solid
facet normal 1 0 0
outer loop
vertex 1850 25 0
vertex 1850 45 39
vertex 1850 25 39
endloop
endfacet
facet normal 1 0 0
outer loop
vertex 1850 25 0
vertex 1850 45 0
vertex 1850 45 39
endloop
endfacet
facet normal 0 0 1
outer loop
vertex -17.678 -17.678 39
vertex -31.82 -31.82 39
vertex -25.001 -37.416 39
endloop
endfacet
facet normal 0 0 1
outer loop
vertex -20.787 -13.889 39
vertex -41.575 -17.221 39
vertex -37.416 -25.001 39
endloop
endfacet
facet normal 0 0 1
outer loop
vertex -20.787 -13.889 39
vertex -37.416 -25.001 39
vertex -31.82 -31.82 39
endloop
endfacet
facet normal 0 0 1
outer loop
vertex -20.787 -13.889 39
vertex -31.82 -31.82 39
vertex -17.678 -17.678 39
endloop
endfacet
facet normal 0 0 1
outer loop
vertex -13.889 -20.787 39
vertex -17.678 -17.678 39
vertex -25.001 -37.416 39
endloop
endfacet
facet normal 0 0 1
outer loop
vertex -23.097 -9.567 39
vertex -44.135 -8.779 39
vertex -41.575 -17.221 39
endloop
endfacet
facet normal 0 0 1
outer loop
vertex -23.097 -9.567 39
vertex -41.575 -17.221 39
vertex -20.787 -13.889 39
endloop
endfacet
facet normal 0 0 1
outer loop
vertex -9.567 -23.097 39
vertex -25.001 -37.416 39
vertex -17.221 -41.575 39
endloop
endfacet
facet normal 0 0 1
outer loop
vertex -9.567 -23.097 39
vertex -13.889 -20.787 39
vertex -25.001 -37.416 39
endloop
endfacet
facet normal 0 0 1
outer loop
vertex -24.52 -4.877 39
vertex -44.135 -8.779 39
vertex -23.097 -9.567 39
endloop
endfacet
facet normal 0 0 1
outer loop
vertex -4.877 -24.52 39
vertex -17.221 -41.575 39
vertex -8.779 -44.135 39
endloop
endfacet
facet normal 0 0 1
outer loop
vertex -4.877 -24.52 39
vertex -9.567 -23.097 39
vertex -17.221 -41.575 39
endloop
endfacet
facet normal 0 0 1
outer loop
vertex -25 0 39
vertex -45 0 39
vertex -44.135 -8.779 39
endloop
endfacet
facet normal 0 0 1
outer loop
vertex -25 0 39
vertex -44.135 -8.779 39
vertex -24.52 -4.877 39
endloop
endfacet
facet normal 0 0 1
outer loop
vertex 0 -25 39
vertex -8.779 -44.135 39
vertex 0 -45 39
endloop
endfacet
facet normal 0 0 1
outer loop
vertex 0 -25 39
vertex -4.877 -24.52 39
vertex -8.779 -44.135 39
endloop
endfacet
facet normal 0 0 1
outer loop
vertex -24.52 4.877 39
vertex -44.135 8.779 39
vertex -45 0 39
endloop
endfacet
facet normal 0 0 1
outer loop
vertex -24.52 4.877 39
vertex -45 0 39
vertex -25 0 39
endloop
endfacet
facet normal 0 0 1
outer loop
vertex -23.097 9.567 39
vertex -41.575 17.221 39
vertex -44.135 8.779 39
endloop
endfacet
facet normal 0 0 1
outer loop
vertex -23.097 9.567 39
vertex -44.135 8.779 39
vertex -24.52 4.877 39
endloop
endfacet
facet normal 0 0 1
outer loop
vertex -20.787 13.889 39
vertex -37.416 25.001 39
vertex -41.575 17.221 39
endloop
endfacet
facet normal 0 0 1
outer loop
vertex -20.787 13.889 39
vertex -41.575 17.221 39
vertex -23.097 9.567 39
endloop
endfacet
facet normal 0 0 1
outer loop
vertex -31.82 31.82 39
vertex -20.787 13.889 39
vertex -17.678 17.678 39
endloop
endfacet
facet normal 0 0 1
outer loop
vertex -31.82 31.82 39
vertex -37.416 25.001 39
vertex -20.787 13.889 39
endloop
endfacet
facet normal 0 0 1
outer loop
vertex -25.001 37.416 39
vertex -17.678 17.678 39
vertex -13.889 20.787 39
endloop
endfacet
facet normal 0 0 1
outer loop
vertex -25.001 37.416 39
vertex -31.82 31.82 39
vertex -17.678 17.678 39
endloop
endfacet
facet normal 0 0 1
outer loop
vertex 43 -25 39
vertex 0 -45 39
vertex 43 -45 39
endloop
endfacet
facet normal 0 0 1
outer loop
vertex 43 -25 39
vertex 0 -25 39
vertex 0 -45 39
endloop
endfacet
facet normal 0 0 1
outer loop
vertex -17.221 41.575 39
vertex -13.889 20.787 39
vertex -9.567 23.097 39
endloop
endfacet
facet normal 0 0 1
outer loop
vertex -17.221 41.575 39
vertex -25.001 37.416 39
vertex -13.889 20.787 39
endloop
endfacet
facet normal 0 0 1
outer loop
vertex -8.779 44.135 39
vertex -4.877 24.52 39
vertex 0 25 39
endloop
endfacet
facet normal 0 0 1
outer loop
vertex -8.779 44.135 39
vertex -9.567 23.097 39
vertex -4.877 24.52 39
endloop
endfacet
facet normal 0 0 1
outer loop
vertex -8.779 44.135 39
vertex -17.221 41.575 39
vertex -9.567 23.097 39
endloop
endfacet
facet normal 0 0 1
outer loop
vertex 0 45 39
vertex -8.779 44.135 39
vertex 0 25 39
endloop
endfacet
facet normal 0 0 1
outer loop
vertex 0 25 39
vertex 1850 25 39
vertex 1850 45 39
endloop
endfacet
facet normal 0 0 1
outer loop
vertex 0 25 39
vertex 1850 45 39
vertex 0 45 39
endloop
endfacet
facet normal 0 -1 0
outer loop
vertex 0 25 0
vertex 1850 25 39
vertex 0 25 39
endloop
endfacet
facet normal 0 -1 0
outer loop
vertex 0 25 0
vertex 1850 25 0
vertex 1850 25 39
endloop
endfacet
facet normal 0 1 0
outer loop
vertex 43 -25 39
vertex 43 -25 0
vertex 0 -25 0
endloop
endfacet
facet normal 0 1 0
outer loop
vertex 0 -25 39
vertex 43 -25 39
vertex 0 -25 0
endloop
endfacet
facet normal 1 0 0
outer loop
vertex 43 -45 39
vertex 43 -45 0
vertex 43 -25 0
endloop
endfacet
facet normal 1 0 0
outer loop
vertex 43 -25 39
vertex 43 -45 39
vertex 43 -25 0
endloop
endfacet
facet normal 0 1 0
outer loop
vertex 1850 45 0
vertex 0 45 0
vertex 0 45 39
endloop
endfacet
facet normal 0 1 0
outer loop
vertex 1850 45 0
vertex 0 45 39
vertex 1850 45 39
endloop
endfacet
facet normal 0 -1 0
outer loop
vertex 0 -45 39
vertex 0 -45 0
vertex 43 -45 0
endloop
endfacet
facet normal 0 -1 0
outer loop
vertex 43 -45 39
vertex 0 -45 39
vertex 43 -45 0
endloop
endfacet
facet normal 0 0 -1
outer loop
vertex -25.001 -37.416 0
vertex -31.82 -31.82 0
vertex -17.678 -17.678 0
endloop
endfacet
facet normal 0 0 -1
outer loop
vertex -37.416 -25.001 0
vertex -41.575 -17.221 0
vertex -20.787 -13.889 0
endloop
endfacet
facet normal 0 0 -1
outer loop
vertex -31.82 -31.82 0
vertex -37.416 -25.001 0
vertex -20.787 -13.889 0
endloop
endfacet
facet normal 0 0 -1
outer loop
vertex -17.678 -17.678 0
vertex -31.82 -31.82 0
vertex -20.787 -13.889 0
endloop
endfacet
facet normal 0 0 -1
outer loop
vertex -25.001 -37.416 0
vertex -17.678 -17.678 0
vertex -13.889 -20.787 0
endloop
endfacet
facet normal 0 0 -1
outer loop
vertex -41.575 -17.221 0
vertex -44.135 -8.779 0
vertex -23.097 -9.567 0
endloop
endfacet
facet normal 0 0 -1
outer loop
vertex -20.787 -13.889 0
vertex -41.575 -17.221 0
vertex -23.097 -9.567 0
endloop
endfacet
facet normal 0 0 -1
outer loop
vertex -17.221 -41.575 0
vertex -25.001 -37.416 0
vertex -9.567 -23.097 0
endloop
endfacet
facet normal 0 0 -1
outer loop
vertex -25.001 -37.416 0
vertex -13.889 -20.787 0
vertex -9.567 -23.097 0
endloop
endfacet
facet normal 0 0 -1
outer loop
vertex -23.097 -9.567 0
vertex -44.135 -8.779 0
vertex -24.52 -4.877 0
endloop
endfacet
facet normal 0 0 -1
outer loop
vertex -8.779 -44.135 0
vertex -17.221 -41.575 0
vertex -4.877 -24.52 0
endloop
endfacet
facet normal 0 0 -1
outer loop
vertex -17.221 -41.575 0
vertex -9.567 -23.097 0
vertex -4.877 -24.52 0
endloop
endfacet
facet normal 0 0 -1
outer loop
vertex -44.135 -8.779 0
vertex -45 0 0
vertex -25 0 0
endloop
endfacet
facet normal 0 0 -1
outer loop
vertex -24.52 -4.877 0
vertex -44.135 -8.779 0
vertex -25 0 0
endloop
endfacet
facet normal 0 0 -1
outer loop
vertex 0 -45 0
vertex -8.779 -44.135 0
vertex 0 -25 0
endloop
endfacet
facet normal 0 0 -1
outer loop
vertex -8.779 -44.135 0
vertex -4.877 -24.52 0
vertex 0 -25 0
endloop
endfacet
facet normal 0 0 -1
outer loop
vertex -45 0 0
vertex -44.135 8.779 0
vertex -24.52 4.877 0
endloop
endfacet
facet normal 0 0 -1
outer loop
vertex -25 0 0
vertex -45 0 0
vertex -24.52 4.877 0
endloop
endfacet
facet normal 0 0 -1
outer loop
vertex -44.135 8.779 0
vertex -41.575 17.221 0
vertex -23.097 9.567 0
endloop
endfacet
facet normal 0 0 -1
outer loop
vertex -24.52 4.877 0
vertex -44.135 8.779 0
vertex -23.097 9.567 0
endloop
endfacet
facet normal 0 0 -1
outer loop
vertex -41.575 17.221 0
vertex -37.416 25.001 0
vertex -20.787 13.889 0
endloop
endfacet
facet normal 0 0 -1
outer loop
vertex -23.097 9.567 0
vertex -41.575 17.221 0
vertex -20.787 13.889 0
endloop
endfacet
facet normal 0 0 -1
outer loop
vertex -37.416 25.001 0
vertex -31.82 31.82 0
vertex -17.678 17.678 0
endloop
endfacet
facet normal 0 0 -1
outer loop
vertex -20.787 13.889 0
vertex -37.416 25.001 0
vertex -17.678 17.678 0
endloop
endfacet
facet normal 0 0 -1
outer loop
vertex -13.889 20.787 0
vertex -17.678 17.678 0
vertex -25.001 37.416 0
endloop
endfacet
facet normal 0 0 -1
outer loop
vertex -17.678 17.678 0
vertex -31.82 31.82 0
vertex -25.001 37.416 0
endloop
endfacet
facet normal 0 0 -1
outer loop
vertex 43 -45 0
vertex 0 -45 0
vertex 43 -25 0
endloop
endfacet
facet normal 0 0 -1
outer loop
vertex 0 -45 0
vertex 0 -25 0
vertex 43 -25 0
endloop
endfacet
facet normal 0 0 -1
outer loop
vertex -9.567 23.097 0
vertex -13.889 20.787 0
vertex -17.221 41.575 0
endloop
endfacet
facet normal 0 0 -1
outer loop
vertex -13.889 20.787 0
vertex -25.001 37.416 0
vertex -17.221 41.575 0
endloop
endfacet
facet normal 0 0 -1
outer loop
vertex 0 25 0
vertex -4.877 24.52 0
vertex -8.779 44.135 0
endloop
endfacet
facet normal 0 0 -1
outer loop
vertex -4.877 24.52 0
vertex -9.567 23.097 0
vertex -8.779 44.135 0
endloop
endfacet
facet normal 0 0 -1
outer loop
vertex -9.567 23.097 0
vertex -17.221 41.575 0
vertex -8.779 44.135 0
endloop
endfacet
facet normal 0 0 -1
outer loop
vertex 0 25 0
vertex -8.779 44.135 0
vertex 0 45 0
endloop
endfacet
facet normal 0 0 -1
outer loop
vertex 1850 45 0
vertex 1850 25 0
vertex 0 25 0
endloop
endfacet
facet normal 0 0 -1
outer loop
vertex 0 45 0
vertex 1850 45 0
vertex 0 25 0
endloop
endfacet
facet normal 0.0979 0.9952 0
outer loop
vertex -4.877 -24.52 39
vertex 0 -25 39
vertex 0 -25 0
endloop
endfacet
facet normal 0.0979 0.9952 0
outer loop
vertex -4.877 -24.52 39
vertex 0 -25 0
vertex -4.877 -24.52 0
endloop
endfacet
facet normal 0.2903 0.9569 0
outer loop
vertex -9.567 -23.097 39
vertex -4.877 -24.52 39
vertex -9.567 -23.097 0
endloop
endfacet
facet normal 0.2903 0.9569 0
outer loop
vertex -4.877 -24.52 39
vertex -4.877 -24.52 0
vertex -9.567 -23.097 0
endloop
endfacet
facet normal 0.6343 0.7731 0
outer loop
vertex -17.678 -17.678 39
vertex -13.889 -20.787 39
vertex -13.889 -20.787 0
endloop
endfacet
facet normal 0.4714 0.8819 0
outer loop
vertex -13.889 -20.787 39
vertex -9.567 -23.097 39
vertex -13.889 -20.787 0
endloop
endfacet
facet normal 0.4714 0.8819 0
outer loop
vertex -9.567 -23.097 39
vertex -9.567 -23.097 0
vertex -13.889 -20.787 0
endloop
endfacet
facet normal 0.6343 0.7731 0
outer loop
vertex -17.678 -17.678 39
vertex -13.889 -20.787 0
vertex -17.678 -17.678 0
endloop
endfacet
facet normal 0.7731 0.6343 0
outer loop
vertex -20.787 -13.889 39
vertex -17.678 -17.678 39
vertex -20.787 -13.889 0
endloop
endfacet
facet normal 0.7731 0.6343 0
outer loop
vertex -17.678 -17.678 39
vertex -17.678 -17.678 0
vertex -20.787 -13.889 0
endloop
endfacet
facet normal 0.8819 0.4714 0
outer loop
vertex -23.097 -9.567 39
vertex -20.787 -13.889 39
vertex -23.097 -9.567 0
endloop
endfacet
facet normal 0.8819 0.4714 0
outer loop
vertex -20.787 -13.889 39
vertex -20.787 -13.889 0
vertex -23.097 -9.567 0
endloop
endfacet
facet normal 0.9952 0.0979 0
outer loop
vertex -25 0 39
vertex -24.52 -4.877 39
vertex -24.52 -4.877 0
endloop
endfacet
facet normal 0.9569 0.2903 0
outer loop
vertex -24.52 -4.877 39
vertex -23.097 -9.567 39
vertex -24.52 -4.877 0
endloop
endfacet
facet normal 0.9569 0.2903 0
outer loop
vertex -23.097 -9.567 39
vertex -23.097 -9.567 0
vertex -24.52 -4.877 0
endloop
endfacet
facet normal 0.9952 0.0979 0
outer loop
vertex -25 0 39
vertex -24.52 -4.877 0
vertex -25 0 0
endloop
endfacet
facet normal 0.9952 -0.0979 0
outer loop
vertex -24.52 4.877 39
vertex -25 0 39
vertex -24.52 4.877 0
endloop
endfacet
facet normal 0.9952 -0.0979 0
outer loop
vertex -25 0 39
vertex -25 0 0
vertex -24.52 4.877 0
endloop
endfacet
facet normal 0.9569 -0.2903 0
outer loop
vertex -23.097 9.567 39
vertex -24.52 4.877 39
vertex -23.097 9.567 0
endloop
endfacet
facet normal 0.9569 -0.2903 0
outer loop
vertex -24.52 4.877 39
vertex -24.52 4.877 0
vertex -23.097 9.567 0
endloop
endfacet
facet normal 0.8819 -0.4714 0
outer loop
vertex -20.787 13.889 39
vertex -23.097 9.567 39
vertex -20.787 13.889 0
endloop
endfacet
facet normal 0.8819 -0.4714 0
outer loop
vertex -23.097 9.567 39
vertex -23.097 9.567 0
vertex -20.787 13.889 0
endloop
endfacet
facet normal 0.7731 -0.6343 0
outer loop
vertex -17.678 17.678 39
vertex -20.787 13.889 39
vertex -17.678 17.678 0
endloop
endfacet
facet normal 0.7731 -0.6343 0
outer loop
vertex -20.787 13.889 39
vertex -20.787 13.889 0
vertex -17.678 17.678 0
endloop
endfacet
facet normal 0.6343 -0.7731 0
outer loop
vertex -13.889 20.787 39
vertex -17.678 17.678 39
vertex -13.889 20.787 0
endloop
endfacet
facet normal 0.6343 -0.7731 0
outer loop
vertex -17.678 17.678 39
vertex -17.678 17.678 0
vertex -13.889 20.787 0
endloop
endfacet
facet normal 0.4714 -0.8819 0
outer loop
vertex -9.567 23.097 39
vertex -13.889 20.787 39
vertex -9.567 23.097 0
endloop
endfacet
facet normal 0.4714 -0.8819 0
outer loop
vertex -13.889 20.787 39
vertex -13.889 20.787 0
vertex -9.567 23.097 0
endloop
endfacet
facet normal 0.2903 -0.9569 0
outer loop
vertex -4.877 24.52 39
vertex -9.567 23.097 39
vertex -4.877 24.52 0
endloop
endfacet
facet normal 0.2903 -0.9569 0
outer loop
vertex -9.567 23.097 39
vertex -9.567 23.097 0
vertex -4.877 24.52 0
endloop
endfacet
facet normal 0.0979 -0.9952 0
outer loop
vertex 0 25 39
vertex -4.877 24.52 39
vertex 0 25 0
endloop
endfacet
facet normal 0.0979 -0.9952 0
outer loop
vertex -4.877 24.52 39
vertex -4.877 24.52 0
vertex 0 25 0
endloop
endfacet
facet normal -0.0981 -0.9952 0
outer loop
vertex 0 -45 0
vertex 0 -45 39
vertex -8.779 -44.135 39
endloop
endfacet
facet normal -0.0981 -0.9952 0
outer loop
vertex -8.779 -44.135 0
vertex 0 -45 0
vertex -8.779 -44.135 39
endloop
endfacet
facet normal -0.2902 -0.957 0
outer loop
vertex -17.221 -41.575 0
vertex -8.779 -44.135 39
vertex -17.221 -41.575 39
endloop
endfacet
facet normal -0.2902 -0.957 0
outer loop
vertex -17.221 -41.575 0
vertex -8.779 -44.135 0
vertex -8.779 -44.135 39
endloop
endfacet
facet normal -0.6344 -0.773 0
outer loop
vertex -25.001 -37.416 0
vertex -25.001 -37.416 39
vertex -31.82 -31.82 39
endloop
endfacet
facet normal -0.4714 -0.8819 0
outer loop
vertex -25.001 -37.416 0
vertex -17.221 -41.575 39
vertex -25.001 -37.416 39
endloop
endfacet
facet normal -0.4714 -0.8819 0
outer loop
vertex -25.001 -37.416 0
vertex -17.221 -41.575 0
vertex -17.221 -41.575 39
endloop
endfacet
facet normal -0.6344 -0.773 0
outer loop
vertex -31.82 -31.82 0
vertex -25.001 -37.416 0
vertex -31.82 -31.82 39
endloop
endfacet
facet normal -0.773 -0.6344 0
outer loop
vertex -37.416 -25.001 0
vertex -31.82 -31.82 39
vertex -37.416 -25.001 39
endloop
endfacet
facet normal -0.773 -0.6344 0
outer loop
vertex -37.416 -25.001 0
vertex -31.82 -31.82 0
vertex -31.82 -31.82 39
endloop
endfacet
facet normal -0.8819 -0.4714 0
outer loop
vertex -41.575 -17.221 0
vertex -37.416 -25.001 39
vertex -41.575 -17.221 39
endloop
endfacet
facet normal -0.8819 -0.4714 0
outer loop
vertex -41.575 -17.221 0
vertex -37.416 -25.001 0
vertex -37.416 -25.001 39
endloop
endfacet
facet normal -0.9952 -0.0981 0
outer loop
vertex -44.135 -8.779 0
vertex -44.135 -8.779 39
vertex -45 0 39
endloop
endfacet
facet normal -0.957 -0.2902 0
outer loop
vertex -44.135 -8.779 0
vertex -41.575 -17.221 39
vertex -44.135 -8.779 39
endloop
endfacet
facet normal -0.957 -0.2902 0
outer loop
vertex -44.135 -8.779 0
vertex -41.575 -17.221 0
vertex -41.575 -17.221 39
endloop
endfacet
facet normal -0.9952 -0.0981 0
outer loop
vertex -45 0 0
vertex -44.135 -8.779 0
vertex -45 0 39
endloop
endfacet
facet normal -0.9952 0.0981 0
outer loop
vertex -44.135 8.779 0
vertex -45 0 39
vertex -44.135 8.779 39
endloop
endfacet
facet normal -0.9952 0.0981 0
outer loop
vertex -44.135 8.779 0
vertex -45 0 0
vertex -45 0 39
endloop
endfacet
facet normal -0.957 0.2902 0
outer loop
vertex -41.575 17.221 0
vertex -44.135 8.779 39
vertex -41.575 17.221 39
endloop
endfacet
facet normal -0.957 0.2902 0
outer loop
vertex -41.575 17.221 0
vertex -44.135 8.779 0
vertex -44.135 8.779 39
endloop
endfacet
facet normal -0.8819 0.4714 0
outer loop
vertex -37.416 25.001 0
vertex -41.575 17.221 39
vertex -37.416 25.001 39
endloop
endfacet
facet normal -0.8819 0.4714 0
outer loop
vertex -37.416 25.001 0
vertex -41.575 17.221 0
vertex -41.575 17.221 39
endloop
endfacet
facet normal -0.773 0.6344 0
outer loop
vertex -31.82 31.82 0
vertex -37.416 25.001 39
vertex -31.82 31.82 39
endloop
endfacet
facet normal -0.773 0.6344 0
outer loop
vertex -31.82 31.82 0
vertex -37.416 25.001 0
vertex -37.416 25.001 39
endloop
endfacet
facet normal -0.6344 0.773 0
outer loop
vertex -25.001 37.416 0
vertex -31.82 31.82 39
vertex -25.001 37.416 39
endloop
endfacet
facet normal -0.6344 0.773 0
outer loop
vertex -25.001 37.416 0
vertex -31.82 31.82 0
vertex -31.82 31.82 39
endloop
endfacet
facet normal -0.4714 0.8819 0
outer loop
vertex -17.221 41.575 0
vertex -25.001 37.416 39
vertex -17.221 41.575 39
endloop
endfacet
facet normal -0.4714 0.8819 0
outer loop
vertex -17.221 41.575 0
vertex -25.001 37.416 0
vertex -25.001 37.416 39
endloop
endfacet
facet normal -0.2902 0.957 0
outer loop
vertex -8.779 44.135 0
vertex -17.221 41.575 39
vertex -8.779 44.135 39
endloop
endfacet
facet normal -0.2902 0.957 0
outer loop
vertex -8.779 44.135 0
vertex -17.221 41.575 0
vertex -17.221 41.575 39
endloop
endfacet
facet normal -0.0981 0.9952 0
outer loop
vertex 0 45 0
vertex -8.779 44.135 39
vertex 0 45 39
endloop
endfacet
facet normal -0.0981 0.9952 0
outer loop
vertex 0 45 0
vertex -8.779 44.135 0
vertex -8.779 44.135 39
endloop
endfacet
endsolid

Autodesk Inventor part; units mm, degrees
ref_plane "YZ Plane" through (0, 0, 0) normal (1, 0, 0) x (0, 1, 0)
ref_plane "XZ Plane" through (0, 0, 0) normal (0, 1, 0) x (-1, 0, 0)
ref_plane "XY Plane" through (0, 0, 0) normal (0, 0, 1) x (1, 0, 0)
sketch "Sketch1" plane through (0, 0, 0) normal (0, 0, 1) x (1, 0, 0)
  circle A0 centre (0, 0) radius 45
  line L0 (0, -45) -> (43, -45)
  line L1 (43, -45) -> (43, -25)
  line L2 (43, -25) -> (0, -25)
  line L3 (0, -25) -> (0, -45)
  line L4 (0, 45) -> (1850, 45)
  line L5 (1850, 45) -> (1850, 25)
  line L6 (1850, 25) -> (0, 25)
  line L7 (0, 25) -> (0, 45)
  circle A1 centre (0, 0) radius 25
  point P0 (0, -25)
  point P1 (0, 25)
  point P2 (13, -25)
  point P3 (-45, 0)
  dimension "d0" = 90
  dimension "d1" = 20
  dimension "d2" = 20
  dimension "d9" = 1850
  dimension "d10" = 58
  dimension "d11" = 30
extrude "Extrusion1" add sketch "Sketch1" along normal blind 39 contours L7 A1 L3 A0 | L4 L5 L6 A0 | A0 L6 L7 | L3 L2 A0 | A0 L2 L1 L0
properties part number "J15BF.1.30_Yaxis"
